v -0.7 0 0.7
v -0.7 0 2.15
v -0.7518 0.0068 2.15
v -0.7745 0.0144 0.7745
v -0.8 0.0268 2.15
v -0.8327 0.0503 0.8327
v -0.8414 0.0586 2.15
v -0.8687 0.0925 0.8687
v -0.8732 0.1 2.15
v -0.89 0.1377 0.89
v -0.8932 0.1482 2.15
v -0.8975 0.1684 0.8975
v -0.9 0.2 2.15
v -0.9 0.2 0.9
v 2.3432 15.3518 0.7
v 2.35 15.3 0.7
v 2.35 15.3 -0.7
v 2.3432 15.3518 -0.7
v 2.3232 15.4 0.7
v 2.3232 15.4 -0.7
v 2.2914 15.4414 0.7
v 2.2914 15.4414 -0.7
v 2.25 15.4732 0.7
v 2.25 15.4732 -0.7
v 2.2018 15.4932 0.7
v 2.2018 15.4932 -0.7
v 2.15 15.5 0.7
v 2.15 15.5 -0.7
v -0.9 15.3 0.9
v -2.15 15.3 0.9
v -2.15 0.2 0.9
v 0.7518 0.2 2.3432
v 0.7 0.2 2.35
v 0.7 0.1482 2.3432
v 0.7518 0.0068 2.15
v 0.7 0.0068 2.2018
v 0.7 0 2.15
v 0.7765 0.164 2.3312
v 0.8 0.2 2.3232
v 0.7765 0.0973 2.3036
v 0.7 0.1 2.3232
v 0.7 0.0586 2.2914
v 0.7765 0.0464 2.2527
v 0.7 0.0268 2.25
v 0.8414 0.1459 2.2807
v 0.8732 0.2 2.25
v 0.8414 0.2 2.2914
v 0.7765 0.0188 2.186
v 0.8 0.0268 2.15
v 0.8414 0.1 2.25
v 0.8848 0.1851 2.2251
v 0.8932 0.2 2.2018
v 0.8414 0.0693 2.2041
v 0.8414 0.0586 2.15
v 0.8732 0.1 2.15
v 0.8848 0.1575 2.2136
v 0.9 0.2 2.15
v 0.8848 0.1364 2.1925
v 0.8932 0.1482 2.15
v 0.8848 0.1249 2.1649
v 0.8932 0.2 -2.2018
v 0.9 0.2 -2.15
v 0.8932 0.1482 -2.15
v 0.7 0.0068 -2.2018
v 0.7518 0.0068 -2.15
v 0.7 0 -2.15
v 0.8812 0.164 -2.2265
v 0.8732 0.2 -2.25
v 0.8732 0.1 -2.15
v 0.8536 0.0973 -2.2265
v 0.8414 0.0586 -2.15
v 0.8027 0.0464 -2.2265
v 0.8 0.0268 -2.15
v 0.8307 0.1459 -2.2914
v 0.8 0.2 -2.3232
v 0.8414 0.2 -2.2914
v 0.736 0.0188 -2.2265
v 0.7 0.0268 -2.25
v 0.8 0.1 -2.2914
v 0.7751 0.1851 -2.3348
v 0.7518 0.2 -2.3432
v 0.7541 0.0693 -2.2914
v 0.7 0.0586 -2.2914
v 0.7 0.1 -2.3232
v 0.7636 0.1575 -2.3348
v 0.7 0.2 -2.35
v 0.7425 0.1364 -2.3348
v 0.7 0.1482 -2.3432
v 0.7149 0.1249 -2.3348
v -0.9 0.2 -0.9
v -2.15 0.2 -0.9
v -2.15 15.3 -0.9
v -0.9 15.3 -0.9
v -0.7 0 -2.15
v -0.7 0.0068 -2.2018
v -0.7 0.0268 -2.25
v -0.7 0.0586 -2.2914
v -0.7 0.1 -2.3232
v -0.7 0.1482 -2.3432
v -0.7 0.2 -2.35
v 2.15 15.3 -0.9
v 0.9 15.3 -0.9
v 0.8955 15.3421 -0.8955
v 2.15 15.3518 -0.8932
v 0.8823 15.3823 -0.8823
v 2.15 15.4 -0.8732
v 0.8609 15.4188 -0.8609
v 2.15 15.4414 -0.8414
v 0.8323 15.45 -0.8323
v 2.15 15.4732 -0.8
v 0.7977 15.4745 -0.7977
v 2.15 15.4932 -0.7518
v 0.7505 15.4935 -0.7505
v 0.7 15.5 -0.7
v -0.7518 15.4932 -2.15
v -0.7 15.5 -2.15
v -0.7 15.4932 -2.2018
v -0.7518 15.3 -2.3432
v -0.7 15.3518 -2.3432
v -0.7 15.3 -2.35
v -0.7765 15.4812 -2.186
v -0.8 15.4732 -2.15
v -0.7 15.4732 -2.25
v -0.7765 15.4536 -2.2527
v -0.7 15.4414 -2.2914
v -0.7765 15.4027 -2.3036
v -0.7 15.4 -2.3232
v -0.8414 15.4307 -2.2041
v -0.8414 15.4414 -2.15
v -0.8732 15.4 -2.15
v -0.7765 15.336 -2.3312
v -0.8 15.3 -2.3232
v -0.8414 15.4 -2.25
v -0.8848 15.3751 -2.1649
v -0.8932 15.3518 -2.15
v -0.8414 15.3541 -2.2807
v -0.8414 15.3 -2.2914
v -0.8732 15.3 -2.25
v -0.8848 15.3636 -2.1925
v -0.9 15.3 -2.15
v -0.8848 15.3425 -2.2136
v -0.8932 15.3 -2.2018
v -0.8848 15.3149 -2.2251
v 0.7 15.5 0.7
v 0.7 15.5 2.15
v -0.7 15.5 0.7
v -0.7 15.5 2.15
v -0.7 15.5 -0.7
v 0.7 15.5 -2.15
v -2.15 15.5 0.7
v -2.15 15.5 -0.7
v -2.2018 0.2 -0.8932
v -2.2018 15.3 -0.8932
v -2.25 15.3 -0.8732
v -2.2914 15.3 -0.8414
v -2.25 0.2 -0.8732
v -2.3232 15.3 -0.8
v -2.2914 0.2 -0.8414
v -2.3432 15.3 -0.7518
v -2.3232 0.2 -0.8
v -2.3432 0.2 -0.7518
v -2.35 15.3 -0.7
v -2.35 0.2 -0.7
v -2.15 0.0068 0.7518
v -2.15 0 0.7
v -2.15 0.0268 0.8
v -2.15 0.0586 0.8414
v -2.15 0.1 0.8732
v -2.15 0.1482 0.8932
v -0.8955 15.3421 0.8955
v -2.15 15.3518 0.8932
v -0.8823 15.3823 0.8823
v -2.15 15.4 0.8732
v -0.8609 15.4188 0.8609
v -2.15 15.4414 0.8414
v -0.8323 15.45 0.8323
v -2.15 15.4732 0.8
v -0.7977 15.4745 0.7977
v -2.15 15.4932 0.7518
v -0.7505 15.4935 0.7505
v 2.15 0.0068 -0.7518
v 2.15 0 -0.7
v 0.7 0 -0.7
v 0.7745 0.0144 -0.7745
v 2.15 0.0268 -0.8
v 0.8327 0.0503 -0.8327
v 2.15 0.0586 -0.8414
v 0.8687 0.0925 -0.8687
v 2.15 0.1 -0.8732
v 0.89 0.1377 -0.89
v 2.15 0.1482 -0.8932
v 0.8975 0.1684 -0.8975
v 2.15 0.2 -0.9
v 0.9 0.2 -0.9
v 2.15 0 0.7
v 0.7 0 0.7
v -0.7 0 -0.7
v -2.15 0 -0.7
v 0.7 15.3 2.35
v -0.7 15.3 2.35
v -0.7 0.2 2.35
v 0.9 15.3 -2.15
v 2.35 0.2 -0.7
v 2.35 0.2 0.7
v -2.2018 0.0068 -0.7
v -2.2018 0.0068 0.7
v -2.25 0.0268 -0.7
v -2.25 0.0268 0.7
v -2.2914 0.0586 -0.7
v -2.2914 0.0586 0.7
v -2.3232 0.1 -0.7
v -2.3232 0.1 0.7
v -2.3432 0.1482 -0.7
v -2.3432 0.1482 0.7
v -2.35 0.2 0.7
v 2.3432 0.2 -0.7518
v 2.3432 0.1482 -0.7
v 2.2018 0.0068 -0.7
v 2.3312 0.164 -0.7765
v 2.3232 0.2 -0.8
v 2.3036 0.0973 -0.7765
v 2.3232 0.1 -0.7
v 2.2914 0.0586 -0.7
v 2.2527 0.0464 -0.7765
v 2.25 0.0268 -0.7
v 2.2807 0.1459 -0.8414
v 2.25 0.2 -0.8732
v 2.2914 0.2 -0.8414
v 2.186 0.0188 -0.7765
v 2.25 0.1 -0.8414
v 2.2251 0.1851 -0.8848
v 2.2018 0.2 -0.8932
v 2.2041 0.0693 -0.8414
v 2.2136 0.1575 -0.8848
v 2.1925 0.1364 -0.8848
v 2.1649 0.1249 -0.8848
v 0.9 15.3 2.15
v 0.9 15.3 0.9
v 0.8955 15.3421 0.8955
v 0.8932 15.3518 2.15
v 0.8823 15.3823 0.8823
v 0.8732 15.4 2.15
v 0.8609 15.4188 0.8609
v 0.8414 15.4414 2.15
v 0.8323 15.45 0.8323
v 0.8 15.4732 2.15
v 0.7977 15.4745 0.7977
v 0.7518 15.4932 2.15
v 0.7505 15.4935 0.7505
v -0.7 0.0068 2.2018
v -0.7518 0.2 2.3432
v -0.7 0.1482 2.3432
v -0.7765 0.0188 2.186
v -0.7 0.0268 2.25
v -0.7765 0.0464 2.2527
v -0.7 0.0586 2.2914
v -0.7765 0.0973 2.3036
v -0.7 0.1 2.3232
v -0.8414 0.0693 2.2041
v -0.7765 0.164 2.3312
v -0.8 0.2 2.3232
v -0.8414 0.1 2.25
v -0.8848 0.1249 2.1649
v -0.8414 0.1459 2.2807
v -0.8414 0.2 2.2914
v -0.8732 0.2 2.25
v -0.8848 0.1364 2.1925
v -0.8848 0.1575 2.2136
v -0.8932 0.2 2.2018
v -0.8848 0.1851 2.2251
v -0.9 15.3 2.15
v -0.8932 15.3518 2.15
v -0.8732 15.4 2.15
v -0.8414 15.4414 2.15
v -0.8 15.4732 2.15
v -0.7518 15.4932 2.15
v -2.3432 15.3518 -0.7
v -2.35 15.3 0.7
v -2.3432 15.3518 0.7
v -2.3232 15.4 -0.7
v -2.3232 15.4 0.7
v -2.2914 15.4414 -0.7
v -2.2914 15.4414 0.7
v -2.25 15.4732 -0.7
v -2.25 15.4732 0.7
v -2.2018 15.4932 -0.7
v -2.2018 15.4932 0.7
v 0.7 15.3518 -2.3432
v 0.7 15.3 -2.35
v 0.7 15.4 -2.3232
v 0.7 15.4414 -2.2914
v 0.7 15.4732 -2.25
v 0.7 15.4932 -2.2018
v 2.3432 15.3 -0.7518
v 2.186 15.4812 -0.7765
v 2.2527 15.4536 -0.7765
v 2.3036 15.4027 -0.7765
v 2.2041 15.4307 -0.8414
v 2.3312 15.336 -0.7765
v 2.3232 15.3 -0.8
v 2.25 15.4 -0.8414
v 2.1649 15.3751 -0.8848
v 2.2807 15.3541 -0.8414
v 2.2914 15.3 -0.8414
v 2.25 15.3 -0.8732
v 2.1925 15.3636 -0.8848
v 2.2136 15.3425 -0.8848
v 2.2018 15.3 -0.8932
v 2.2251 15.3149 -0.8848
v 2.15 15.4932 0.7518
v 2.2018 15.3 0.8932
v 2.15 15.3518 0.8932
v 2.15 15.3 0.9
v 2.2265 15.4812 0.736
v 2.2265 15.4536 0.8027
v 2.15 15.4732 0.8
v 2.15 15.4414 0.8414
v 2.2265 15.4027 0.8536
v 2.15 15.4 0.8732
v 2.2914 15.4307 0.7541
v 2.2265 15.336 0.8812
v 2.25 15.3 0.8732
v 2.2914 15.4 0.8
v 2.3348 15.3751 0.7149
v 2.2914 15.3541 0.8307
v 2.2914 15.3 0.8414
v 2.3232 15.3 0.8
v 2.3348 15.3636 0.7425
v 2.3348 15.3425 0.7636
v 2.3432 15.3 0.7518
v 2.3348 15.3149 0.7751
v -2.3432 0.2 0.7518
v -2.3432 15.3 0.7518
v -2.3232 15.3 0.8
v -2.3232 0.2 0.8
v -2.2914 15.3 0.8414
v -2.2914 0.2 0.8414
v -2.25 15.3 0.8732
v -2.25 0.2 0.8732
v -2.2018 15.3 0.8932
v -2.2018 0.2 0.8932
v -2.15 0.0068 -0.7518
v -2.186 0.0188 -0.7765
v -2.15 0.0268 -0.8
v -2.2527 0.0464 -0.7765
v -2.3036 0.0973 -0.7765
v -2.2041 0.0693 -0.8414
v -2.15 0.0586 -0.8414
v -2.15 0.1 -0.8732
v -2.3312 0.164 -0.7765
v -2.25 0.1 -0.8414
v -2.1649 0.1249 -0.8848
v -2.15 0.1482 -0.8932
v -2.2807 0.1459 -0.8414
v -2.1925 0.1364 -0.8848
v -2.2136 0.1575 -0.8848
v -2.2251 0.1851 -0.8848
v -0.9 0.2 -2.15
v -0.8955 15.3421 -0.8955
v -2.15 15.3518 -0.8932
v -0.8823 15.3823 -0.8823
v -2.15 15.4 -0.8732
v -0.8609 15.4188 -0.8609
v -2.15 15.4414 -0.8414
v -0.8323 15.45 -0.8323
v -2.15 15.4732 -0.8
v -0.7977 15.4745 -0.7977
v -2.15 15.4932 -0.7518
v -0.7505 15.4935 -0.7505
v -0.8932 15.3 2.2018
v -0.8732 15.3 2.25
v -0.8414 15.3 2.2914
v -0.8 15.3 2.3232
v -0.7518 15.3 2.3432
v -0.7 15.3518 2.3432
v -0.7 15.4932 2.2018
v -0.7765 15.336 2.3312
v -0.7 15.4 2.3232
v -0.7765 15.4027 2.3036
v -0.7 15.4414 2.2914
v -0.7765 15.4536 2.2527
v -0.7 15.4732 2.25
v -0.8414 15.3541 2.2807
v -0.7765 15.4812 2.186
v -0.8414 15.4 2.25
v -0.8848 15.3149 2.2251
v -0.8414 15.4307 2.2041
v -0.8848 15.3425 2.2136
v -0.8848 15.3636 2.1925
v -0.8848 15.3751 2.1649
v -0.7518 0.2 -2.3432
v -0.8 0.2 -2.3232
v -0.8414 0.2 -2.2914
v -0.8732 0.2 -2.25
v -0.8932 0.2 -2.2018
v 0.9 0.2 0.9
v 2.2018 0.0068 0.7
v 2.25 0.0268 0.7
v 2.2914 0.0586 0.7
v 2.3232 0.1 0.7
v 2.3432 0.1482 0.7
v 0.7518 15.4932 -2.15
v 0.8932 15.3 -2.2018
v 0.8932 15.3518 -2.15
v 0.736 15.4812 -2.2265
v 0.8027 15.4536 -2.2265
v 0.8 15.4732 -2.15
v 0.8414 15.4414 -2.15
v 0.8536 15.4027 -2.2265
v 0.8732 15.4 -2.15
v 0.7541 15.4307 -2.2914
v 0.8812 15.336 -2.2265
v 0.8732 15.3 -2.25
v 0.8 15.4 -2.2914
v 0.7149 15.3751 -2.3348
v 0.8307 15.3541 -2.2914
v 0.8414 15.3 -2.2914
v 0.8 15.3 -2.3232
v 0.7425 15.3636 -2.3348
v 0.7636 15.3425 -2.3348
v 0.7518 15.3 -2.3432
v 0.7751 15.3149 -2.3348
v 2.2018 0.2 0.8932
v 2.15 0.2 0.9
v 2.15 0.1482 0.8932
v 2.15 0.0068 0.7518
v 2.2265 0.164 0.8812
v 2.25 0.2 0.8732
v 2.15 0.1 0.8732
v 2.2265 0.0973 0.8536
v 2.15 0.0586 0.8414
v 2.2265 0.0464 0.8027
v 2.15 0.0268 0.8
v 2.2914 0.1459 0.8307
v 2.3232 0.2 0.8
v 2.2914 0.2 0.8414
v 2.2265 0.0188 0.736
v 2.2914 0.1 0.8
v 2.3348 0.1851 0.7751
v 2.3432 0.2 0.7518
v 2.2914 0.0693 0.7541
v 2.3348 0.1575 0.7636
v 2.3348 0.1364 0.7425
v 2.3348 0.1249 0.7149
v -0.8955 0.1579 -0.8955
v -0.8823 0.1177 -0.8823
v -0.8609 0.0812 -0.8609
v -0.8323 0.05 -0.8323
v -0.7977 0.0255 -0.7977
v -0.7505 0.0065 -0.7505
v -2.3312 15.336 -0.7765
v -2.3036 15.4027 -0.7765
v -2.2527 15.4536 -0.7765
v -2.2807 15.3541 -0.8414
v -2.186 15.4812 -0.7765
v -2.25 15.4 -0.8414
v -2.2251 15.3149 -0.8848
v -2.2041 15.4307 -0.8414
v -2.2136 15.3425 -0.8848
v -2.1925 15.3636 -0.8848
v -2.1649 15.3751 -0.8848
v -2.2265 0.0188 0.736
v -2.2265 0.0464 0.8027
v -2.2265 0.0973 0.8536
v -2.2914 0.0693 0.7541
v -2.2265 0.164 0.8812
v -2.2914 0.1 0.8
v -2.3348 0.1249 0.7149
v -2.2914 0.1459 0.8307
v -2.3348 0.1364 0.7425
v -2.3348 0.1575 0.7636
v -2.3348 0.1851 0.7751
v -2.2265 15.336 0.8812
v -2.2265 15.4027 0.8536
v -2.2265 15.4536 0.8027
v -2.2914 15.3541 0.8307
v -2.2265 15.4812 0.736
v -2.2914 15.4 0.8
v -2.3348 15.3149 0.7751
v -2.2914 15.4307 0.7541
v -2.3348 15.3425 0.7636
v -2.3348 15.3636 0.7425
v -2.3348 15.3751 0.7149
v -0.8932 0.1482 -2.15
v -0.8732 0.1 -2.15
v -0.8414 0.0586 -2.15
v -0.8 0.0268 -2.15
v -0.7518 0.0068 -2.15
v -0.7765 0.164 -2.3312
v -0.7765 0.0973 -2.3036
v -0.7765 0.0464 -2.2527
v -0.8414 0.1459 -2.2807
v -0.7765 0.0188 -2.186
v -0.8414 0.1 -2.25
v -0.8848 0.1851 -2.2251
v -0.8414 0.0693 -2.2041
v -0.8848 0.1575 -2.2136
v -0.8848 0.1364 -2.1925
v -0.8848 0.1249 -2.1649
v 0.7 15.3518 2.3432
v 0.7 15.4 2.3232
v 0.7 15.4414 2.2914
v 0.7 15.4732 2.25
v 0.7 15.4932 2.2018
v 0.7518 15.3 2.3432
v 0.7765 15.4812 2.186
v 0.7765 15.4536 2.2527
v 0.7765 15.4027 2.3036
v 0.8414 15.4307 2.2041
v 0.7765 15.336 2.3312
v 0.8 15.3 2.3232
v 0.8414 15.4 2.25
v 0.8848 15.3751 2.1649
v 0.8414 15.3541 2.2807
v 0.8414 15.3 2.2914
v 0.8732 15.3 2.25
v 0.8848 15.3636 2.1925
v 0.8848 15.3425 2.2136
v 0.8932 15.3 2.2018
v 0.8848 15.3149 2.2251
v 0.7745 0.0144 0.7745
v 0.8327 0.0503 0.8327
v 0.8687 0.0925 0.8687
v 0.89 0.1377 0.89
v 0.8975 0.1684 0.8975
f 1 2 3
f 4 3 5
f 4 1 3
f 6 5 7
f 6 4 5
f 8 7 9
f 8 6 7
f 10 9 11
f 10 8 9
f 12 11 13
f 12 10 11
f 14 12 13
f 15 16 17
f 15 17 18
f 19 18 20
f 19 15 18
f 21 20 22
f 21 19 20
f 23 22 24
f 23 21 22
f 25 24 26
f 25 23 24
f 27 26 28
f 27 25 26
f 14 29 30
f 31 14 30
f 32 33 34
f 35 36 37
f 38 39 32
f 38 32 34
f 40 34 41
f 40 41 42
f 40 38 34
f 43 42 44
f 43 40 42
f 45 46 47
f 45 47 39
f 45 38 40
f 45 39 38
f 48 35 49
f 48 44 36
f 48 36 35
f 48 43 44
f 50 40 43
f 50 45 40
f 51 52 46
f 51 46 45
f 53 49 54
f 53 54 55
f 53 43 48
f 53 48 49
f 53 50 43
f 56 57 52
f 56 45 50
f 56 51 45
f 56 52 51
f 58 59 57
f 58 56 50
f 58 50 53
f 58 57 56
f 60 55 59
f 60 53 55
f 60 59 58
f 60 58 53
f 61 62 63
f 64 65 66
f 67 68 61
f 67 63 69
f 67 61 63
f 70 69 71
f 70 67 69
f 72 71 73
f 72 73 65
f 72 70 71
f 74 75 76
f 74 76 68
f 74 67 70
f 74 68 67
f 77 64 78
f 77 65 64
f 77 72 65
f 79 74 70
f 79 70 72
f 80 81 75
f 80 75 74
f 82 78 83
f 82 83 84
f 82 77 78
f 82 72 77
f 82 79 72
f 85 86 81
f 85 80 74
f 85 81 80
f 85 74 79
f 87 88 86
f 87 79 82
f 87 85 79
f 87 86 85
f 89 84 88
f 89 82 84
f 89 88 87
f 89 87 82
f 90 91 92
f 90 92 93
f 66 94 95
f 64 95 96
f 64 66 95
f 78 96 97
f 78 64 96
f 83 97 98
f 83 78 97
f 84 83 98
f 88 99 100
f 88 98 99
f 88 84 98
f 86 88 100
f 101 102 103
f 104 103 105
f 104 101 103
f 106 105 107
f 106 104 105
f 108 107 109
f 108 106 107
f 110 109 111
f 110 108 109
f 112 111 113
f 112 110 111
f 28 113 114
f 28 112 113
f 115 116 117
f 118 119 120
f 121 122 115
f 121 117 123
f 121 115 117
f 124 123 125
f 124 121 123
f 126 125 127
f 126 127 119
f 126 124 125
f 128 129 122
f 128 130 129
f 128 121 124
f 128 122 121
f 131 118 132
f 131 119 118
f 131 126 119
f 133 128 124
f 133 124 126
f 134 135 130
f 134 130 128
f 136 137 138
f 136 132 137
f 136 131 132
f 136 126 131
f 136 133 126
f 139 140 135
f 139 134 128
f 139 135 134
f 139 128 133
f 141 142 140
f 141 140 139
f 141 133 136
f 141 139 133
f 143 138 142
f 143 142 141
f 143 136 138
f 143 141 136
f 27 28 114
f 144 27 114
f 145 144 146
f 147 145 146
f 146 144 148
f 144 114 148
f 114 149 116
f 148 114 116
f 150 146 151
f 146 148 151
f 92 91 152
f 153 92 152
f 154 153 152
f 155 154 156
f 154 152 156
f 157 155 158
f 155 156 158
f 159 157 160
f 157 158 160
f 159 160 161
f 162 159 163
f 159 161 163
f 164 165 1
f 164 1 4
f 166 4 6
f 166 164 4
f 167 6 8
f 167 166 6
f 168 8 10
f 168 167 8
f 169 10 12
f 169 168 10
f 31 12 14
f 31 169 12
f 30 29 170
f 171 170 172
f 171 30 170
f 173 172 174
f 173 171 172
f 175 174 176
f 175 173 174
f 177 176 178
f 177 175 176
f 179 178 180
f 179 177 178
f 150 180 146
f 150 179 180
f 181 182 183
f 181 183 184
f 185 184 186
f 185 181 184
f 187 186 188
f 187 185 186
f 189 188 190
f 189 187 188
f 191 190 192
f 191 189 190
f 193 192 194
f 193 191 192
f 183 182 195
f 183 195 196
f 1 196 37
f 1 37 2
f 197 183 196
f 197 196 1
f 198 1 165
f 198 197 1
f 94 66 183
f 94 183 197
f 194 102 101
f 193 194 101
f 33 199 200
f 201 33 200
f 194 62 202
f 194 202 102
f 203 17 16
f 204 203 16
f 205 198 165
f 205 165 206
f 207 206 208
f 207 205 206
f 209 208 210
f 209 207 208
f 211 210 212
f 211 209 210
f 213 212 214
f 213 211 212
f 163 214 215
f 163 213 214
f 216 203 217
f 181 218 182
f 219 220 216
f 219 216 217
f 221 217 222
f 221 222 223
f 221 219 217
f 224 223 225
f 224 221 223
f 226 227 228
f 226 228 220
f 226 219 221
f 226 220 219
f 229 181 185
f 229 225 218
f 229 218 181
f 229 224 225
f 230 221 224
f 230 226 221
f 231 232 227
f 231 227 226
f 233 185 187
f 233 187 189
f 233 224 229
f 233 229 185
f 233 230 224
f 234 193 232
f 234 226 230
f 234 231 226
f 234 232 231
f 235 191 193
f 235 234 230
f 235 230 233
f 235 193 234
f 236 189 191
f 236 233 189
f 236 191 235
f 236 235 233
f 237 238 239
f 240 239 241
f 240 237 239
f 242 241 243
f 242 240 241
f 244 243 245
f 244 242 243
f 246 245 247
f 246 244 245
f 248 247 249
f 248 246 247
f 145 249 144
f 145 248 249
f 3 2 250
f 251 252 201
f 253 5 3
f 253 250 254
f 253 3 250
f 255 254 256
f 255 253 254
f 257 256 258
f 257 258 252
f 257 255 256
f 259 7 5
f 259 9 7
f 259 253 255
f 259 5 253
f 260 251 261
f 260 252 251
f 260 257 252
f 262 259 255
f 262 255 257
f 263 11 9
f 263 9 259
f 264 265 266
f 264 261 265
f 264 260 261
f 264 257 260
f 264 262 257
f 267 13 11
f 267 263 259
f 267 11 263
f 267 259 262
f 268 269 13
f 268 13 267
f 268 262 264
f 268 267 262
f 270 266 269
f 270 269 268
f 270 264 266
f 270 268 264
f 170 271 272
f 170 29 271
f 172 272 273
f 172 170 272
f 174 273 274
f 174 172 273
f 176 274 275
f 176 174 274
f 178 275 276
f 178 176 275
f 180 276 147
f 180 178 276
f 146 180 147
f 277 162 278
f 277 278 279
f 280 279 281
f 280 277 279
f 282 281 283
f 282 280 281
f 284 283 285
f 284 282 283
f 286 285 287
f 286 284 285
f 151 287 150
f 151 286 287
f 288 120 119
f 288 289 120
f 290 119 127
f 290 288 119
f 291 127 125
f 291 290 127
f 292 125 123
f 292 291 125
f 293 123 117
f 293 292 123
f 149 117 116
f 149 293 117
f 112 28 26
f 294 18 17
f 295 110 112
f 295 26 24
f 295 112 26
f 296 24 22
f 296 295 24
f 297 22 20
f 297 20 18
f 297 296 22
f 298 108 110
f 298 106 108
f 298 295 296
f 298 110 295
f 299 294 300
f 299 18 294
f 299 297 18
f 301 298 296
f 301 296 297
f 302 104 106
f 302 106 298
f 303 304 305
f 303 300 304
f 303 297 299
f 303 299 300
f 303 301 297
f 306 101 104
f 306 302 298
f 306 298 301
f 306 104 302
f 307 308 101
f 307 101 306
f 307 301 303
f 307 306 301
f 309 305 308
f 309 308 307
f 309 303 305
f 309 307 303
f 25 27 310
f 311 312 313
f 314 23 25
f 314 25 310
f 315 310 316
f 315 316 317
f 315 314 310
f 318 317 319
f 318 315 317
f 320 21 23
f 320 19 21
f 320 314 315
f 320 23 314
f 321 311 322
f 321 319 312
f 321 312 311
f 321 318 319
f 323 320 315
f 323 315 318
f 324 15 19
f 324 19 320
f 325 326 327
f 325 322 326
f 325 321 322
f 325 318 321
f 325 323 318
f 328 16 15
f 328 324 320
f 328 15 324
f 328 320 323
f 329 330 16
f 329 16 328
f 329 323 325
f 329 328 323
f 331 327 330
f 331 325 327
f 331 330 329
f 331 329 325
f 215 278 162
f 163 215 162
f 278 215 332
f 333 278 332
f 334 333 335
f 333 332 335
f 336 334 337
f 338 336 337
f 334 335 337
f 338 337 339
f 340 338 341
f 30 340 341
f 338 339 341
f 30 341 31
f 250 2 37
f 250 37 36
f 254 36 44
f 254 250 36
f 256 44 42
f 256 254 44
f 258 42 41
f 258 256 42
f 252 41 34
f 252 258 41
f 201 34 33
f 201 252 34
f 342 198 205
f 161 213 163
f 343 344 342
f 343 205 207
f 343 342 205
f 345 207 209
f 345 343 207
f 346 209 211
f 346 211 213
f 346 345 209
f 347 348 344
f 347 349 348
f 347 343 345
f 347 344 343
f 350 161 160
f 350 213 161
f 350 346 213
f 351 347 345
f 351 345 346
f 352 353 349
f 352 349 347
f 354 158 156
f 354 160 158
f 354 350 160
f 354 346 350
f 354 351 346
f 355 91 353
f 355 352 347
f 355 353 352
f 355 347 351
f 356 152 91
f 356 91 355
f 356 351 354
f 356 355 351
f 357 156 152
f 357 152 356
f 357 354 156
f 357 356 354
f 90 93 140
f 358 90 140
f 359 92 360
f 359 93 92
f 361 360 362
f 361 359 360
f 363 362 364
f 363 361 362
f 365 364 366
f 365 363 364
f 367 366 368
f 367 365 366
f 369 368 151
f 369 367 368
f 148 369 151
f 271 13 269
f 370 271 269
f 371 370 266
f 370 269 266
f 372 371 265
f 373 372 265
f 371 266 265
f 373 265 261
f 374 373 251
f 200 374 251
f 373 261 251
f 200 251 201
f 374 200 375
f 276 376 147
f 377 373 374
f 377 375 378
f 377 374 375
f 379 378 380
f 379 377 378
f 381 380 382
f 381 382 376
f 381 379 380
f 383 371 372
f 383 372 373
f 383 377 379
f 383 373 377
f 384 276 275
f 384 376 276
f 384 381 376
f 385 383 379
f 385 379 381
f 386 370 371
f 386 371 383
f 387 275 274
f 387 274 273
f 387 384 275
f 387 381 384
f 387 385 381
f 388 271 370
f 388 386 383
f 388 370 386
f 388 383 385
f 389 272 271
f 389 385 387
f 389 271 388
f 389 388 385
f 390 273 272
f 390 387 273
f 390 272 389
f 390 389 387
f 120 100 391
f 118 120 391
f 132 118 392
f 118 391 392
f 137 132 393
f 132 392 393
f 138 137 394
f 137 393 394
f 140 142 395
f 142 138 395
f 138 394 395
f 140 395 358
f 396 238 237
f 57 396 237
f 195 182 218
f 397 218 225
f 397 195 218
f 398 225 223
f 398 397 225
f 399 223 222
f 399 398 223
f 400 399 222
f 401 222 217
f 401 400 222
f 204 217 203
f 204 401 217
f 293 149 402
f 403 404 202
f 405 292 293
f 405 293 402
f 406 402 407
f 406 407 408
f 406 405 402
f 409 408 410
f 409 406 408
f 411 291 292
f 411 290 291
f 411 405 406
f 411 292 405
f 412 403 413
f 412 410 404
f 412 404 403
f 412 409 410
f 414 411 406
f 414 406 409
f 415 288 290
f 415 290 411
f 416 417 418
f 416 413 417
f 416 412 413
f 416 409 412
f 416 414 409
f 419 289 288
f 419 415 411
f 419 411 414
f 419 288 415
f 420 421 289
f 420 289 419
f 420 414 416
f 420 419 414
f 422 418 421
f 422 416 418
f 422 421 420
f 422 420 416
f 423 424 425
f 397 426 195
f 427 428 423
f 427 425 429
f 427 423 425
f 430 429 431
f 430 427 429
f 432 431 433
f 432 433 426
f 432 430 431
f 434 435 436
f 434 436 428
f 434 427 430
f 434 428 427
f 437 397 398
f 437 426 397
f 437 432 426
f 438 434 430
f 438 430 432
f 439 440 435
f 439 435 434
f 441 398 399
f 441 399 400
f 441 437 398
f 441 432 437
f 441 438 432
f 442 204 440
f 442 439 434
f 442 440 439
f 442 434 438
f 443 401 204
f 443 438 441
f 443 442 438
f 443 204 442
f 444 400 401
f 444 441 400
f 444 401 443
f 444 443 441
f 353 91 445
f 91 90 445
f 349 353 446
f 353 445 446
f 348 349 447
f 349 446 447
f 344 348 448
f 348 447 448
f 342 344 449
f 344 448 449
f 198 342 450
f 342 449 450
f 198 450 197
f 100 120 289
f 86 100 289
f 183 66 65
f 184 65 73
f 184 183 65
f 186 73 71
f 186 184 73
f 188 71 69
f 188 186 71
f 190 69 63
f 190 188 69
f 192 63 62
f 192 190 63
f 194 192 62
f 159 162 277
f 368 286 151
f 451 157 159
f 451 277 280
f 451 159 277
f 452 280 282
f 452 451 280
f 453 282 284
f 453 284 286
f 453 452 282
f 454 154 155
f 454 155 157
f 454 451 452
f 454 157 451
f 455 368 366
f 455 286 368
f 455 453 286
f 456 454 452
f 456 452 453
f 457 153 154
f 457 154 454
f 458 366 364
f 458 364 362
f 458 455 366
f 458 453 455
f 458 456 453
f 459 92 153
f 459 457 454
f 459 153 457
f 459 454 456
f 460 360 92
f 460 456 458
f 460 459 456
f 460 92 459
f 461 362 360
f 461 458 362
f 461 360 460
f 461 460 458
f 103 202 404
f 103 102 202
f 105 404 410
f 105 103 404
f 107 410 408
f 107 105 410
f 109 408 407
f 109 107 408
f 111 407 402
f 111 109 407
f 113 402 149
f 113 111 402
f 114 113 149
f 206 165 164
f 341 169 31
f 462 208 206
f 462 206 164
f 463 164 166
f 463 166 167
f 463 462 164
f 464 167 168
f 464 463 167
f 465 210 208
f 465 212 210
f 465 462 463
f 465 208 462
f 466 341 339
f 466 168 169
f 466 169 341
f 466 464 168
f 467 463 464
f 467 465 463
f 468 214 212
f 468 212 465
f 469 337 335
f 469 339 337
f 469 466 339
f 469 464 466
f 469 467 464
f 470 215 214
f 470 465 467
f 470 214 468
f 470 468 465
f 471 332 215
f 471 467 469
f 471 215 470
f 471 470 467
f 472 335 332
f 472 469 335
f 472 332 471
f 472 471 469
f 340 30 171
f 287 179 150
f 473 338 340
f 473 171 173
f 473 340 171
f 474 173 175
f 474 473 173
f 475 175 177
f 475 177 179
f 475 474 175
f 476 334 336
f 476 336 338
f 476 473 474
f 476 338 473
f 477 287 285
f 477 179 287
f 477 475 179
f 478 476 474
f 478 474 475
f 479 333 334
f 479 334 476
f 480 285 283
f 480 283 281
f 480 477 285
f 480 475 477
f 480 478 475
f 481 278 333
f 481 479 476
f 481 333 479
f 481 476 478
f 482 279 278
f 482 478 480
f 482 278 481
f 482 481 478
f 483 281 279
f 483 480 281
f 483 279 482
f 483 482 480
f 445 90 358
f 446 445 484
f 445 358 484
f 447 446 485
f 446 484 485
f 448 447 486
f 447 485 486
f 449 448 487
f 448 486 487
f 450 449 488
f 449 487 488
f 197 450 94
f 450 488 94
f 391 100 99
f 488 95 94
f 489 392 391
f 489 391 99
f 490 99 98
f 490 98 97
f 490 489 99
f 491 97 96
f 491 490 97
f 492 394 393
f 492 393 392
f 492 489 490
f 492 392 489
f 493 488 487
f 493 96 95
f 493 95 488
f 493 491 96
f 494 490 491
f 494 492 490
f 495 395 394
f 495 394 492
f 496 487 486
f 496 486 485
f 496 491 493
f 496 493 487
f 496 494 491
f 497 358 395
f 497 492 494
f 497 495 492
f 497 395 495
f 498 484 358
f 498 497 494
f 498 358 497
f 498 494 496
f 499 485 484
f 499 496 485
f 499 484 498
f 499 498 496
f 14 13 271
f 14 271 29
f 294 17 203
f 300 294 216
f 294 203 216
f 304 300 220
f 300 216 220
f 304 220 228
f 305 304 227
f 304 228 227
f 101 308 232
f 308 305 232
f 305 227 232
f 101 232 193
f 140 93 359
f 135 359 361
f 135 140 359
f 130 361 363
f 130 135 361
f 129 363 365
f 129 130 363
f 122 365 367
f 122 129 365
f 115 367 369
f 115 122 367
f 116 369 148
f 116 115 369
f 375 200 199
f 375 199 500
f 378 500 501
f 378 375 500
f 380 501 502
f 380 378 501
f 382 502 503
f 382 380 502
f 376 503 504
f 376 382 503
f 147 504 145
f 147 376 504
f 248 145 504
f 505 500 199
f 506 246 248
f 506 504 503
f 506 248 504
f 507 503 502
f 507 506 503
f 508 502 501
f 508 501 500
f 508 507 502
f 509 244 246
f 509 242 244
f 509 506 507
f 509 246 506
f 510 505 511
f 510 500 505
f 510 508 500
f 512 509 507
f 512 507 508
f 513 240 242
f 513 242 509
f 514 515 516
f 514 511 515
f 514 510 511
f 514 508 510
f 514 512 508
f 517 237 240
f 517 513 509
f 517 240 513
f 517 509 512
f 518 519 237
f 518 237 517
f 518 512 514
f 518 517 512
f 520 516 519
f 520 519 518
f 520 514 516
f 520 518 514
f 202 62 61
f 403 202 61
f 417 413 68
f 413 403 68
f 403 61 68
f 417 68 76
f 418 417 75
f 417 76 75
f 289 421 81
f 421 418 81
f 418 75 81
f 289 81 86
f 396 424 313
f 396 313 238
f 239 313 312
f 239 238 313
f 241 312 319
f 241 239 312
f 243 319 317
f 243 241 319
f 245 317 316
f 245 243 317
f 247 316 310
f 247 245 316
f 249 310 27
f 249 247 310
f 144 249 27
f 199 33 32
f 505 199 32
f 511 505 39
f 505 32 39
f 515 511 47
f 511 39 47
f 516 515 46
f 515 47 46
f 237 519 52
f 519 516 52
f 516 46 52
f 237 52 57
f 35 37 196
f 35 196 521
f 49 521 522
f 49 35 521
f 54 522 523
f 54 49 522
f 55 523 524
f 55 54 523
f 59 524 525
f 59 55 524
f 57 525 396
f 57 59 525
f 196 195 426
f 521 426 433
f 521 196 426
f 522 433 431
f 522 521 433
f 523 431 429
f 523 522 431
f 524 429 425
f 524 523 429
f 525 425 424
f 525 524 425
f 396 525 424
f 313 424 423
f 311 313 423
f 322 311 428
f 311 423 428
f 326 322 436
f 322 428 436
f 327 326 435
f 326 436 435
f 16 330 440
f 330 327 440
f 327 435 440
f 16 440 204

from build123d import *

# Parameters (mm, degrees)
BOSS_EXTRUDE1_DEPTH = 15.5
FILLET1_R           = 0.2
FILLET2_R           = 0.2
FILLET3_R           = 0.2


with BuildPart() as part:
    # Sketch1 → Boss-Extrude1 (new body)
    with BuildSketch(Plane(origin=(0, 0, 0), x_dir=(1, 0, 0), z_dir=(0, 1, 0))):
        Polygon((-0.9, 0.9), (-0.9, 2.35), (0.9, 2.35), (0.9, 0.9), (2.35, 0.9), (2.35, -0.9), (0.9, -0.9), (0.9, -2.35), (-0.9, -2.35), (-0.9, -0.9), (-2.35, -0.9), (-2.35, 0.9), align=None)
    extrude(amount=BOSS_EXTRUDE1_DEPTH)

    # Fillet1
    fillet1_edges = [part.edges().sort_by_distance(p)[0] for p in [
        (-0.9, 15.5, -1.625),
        (-1.625, 15.5, -0.9),
        (-2.35, 15.5, 0),
        (-1.625, 15.5, 0.9),
        (-0.9, 15.5, 1.625),
        (0, 15.5, 2.35),
        (0.9, 15.5, 1.625),
        (1.625, 15.5, 0.9),
        (2.35, 15.5, 0),
        (1.625, 15.5, -0.9),
        (0.9, 15.5, -1.625),
        (0, 15.5, -2.35),
    ]]
    fillet(fillet1_edges, radius=FILLET1_R)

    # Fillet2
    fillet2_edges = [part.edges().sort_by_distance(p)[0] for p in [
        (1.625, 0, -0.9),
        (2.35, 0, 0),
        (1.625, 0, 0.9),
        (0.9, 0, 1.625),
        (0, 0, 2.35),
        (-0.9, 0, 1.625),
        (-1.625, 0, 0.9),
        (-2.35, 0, 0),
        (-1.625, 0, -0.9),
        (-0.9, 0, -1.625),
        (0, 0, -2.35),
        (0.9, 0, -1.625),
    ]]
    fillet(fillet2_edges, radius=FILLET2_R)

    # Fillet3
    # the kernel refuses this fillet: 0.2 mm, written as the material it takes off along each edge
    with BuildSketch(Plane(origin=(-2.15, 15.3, 0.7), x_dir=(0, 0, 1), z_dir=(-1, 0, 0))) as fillet3_piece_1_section:
        Polygon((0, 0), (FILLET3_R, 0), (FILLET3_R, FILLET3_R), (0, FILLET3_R), align=None)
    fillet3_piece_1 = extrude(amount=FILLET3_R, mode=Mode.PRIVATE)
    fillet3_piece_1 = fillet3_piece_1 - Plane(origin=(-2.15, 15.3, 0.7), x_dir=(0, -0.7071067811865475, -0.7071067811865475), z_dir=(-1, 0, 0)) * Sphere(FILLET3_R, mode=Mode.PRIVATE)
    add(fillet3_piece_1, mode=Mode.SUBTRACT)
    with BuildSketch(Plane(origin=(-0.7, 15.3, 2.15), x_dir=(0, 0, 1), z_dir=(-1, 0, 0))) as fillet3_piece_2_section:
        Polygon((0, 0), (FILLET3_R, 0), (FILLET3_R, FILLET3_R), (0, FILLET3_R), align=None)
    fillet3_piece_2 = extrude(amount=FILLET3_R, mode=Mode.PRIVATE)
    fillet3_piece_2 = fillet3_piece_2 - Plane(origin=(-0.7, 15.3, 2.15), x_dir=(0, -0.7071067811865475, -0.7071067811865475), z_dir=(-1, 0, 0)) * Sphere(FILLET3_R, mode=Mode.PRIVATE)
    add(fillet3_piece_2, mode=Mode.SUBTRACT)
    with BuildSketch(Plane(origin=(-2.15, 15.3, -0.7), x_dir=(-1, 0, 0), z_dir=(0, 0, -1))) as fillet3_piece_3_section:
        Polygon((0, 0), (FILLET3_R, 0), (FILLET3_R, FILLET3_R), (0, FILLET3_R), align=None)
    fillet3_piece_3 = extrude(amount=FILLET3_R, mode=Mode.PRIVATE)
    fillet3_piece_3 = fillet3_piece_3 - Plane(origin=(-2.15, 15.3, -0.7), x_dir=(0.7071067811865475, -0.7071067811865475, 0), z_dir=(0, 0, -1)) * Sphere(FILLET3_R, mode=Mode.PRIVATE)
    add(fillet3_piece_3, mode=Mode.SUBTRACT)
    with BuildSketch(Plane(origin=(0.7, 15.3, 2.15), x_dir=(0, 0, 1), z_dir=(1, 0, 0))) as fillet3_piece_4_section:
        Polygon((0, 0), (FILLET3_R, 0), (FILLET3_R, -FILLET3_R), (0, -FILLET3_R), align=None)
    fillet3_piece_4 = extrude(amount=FILLET3_R, mode=Mode.PRIVATE)
    fillet3_piece_4 = fillet3_piece_4 - Plane(origin=(0.7, 15.3, 2.15), x_dir=(0, -0.7071067811865475, -0.7071067811865475), z_dir=(1, 0, 0)) * Sphere(FILLET3_R, mode=Mode.PRIVATE)
    add(fillet3_piece_4, mode=Mode.SUBTRACT)
    with BuildSketch(Plane(origin=(-0.7, 15.3, -2.15), x_dir=(0, 0, -1), z_dir=(-1, 0, 0))) as fillet3_piece_5_section:
        Polygon((0, 0), (FILLET3_R, 0), (FILLET3_R, -FILLET3_R), (0, -FILLET3_R), align=None)
    fillet3_piece_5 = extrude(amount=FILLET3_R, mode=Mode.PRIVATE)
    fillet3_piece_5 = fillet3_piece_5 - Plane(origin=(-0.7, 15.3, -2.15), x_dir=(0, -0.7071067811865475, 0.7071067811865475), z_dir=(-1, 0, 0)) * Sphere(FILLET3_R, mode=Mode.PRIVATE)
    add(fillet3_piece_5, mode=Mode.SUBTRACT)
    with BuildSketch(Plane(origin=(2.15, 15.3, 0.7), x_dir=(0, 0, 1), z_dir=(1, 0, 0))) as fillet3_piece_6_section:
        Polygon((0, 0), (FILLET3_R, 0), (FILLET3_R, -FILLET3_R), (0, -FILLET3_R), align=None)
    fillet3_piece_6 = extrude(amount=FILLET3_R, mode=Mode.PRIVATE)
    fillet3_piece_6 = fillet3_piece_6 - Plane(origin=(2.15, 15.3, 0.7), x_dir=(0, -0.7071067811865475, -0.7071067811865475), z_dir=(1, 0, 0)) * Sphere(FILLET3_R, mode=Mode.PRIVATE)
    add(fillet3_piece_6, mode=Mode.SUBTRACT)
    with BuildSketch(Plane(origin=(0.7, 15.3, -2.15), x_dir=(1, 0, 0), z_dir=(0, 0, -1))) as fillet3_piece_7_section:
        Polygon((0, 0), (FILLET3_R, 0), (FILLET3_R, -FILLET3_R), (0, -FILLET3_R), align=None)
    fillet3_piece_7 = extrude(amount=FILLET3_R, mode=Mode.PRIVATE)
    fillet3_piece_7 = fillet3_piece_7 - Plane(origin=(0.7, 15.3, -2.15), x_dir=(-0.7071067811865475, -0.7071067811865475, 0), z_dir=(0, 0, -1)) * Sphere(FILLET3_R, mode=Mode.PRIVATE)
    add(fillet3_piece_7, mode=Mode.SUBTRACT)
    with BuildSketch(Plane(origin=(2.15, 15.3, -0.7), x_dir=(1, 0, 0), z_dir=(0, 0, -1))) as fillet3_piece_8_section:
        Polygon((0, 0), (FILLET3_R, 0), (FILLET3_R, -FILLET3_R), (0, -FILLET3_R), align=None)
    fillet3_piece_8 = extrude(amount=FILLET3_R, mode=Mode.PRIVATE)
    fillet3_piece_8 = fillet3_piece_8 - Plane(origin=(2.15, 15.3, -0.7), x_dir=(-0.7071067811865475, -0.7071067811865475, 0), z_dir=(0, 0, -1)) * Sphere(FILLET3_R, mode=Mode.PRIVATE)
    add(fillet3_piece_8, mode=Mode.SUBTRACT)
    with BuildSketch(Plane(origin=(0.7, 0.2, 2.15), x_dir=(0, 0, 1), z_dir=(1, 0, 0))) as fillet3_piece_9_section:
        Polygon((0, 0), (FILLET3_R, 0), (FILLET3_R, FILLET3_R), (0, FILLET3_R), align=None)
    fillet3_piece_9 = extrude(amount=FILLET3_R, mode=Mode.PRIVATE)
    fillet3_piece_9 = fillet3_piece_9 - Plane(origin=(0.7, 0.2, 2.15), x_dir=(0, 0.7071067811865475, -0.7071067811865475), z_dir=(1, 0, 0)) * Sphere(FILLET3_R, mode=Mode.PRIVATE)
    add(fillet3_piece_9, mode=Mode.SUBTRACT)
    with BuildSketch(Plane(origin=(-0.7, 0.2, 2.15), x_dir=(0, 0, 1), z_dir=(-1, 0, 0))) as fillet3_piece_10_section:
        Polygon((0, 0), (FILLET3_R, 0), (FILLET3_R, -FILLET3_R), (0, -FILLET3_R), align=None)
    fillet3_piece_10 = extrude(amount=FILLET3_R, mode=Mode.PRIVATE)
    fillet3_piece_10 = fillet3_piece_10 - Plane(origin=(-0.7, 0.2, 2.15), x_dir=(0, 0.7071067811865475, -0.7071067811865475), z_dir=(-1, 0, 0)) * Sphere(FILLET3_R, mode=Mode.PRIVATE)
    add(fillet3_piece_10, mode=Mode.SUBTRACT)
    with BuildSketch(Plane(origin=(2.15, 0.2, 0.7), x_dir=(0, 0, 1), z_dir=(1, 0, 0))) as fillet3_piece_11_section:
        Polygon((0, 0), (FILLET3_R, 0), (FILLET3_R, FILLET3_R), (0, FILLET3_R), align=None)
    fillet3_piece_11 = extrude(amount=FILLET3_R, mode=Mode.PRIVATE)
    fillet3_piece_11 = fillet3_piece_11 - Plane(origin=(2.15, 0.2, 0.7), x_dir=(0, 0.7071067811865475, -0.7071067811865475), z_dir=(1, 0, 0)) * Sphere(FILLET3_R, mode=Mode.PRIVATE)
    add(fillet3_piece_11, mode=Mode.SUBTRACT)
    with BuildSketch(Plane(origin=(-2.15, 0.2, 0.7), x_dir=(0, 0, 1), z_dir=(-1, 0, 0))) as fillet3_piece_12_section:
        Polygon((0, 0), (FILLET3_R, 0), (FILLET3_R, -FILLET3_R), (0, -FILLET3_R), align=None)
    fillet3_piece_12 = extrude(amount=FILLET3_R, mode=Mode.PRIVATE)
    fillet3_piece_12 = fillet3_piece_12 - Plane(origin=(-2.15, 0.2, 0.7), x_dir=(0, 0.7071067811865475, -0.7071067811865475), z_dir=(-1, 0, 0)) * Sphere(FILLET3_R, mode=Mode.PRIVATE)
    add(fillet3_piece_12, mode=Mode.SUBTRACT)
    with BuildSketch(Plane(origin=(2.15, 0.2, -0.7), x_dir=(1, 0, 0), z_dir=(0, 0, -1))) as fillet3_piece_13_section:
        Polygon((0, 0), (FILLET3_R, 0), (FILLET3_R, FILLET3_R), (0, FILLET3_R), align=None)
    fillet3_piece_13 = extrude(amount=FILLET3_R, mode=Mode.PRIVATE)
    fillet3_piece_13 = fillet3_piece_13 - Plane(origin=(2.15, 0.2, -0.7), x_dir=(-0.7071067811865475, 0.7071067811865475, 0), z_dir=(0, 0, -1)) * Sphere(FILLET3_R, mode=Mode.PRIVATE)
    add(fillet3_piece_13, mode=Mode.SUBTRACT)
    with BuildSketch(Plane(origin=(-2.15, 0.2, -0.7), x_dir=(-1, 0, 0), z_dir=(0, 0, -1))) as fillet3_piece_14_section:
        Polygon((0, 0), (FILLET3_R, 0), (FILLET3_R, -FILLET3_R), (0, -FILLET3_R), align=None)
    fillet3_piece_14 = extrude(amount=FILLET3_R, mode=Mode.PRIVATE)
    fillet3_piece_14 = fillet3_piece_14 - Plane(origin=(-2.15, 0.2, -0.7), x_dir=(0.7071067811865475, 0.7071067811865475, 0), z_dir=(0, 0, -1)) * Sphere(FILLET3_R, mode=Mode.PRIVATE)
    add(fillet3_piece_14, mode=Mode.SUBTRACT)
    with BuildSketch(Plane(origin=(0.7, 0.2, -2.15), x_dir=(1, 0, 0), z_dir=(0, 0, -1))) as fillet3_piece_15_section:
        Polygon((0, 0), (FILLET3_R, 0), (FILLET3_R, FILLET3_R), (0, FILLET3_R), align=None)
    fillet3_piece_15 = extrude(amount=FILLET3_R, mode=Mode.PRIVATE)
    fillet3_piece_15 = fillet3_piece_15 - Plane(origin=(0.7, 0.2, -2.15), x_dir=(-0.7071067811865475, 0.7071067811865475, 0), z_dir=(0, 0, -1)) * Sphere(FILLET3_R, mode=Mode.PRIVATE)
    add(fillet3_piece_15, mode=Mode.SUBTRACT)
    with BuildSketch(Plane(origin=(-0.7, 0.2, -2.15), x_dir=(0, 0, -1), z_dir=(-1, 0, 0))) as fillet3_piece_16_section:
        Polygon((0, 0), (FILLET3_R, 0), (FILLET3_R, FILLET3_R), (0, FILLET3_R), align=None)
    fillet3_piece_16 = extrude(amount=FILLET3_R, mode=Mode.PRIVATE)
    fillet3_piece_16 = fillet3_piece_16 - Plane(origin=(-0.7, 0.2, -2.15), x_dir=(0, 0.7071067811865475, 0.7071067811865475), z_dir=(-1, 0, 0)) * Sphere(FILLET3_R, mode=Mode.PRIVATE)
    add(fillet3_piece_16, mode=Mode.SUBTRACT)
    with BuildSketch(Plane(origin=(2.35, 0.2, -0.9), x_dir=(-1, 0, 0), z_dir=(0, 1, 0)), Plane(origin=(2.35, 0.2, 0.9), x_dir=(0, 0, -1), z_dir=(0, 1, 0)), Plane(origin=(0.9, 0.2, 2.35), x_dir=(0, 0, -1), z_dir=(0, 1, 0)), Plane(origin=(-0.9, 0.2, -2.35), x_dir=(0, 0, 1), z_dir=(0, 1, 0)), Plane(origin=(0.9, 0.2, -2.35), x_dir=(-1, 0, 0), z_dir=(0, 1, 0))) as fillet3_piece_17:
        with BuildLine():
            CenterArc((FILLET3_R, FILLET3_R), FILLET3_R, 180, 90)
            Line((0, FILLET3_R), (0, 0))
            Line((0, 0), (FILLET3_R, 0))
        make_face()
    extrude(amount=15.1, mode=Mode.SUBTRACT)
    with BuildSketch(Plane(origin=(-0.9, 0.2, 2.35), x_dir=(0, 0, -1), z_dir=(0, 1, 0)), Plane(origin=(-2.35, 0.2, 0.9), x_dir=(0, 0, -1), z_dir=(0, 1, 0)), Plane(origin=(-2.35, 0.2, -0.9), x_dir=(1, 0, 0), z_dir=(0, 1, 0))) as fillet3_piece_18:
        with BuildLine():
            CenterArc((FILLET3_R, -FILLET3_R), FILLET3_R, 90, 90)
            Line((0, -FILLET3_R), (0, 0))
            Line((0, 0), (FILLET3_R, 0))
        make_face()
    extrude(amount=15.1, mode=Mode.SUBTRACT)


solid = part.part
